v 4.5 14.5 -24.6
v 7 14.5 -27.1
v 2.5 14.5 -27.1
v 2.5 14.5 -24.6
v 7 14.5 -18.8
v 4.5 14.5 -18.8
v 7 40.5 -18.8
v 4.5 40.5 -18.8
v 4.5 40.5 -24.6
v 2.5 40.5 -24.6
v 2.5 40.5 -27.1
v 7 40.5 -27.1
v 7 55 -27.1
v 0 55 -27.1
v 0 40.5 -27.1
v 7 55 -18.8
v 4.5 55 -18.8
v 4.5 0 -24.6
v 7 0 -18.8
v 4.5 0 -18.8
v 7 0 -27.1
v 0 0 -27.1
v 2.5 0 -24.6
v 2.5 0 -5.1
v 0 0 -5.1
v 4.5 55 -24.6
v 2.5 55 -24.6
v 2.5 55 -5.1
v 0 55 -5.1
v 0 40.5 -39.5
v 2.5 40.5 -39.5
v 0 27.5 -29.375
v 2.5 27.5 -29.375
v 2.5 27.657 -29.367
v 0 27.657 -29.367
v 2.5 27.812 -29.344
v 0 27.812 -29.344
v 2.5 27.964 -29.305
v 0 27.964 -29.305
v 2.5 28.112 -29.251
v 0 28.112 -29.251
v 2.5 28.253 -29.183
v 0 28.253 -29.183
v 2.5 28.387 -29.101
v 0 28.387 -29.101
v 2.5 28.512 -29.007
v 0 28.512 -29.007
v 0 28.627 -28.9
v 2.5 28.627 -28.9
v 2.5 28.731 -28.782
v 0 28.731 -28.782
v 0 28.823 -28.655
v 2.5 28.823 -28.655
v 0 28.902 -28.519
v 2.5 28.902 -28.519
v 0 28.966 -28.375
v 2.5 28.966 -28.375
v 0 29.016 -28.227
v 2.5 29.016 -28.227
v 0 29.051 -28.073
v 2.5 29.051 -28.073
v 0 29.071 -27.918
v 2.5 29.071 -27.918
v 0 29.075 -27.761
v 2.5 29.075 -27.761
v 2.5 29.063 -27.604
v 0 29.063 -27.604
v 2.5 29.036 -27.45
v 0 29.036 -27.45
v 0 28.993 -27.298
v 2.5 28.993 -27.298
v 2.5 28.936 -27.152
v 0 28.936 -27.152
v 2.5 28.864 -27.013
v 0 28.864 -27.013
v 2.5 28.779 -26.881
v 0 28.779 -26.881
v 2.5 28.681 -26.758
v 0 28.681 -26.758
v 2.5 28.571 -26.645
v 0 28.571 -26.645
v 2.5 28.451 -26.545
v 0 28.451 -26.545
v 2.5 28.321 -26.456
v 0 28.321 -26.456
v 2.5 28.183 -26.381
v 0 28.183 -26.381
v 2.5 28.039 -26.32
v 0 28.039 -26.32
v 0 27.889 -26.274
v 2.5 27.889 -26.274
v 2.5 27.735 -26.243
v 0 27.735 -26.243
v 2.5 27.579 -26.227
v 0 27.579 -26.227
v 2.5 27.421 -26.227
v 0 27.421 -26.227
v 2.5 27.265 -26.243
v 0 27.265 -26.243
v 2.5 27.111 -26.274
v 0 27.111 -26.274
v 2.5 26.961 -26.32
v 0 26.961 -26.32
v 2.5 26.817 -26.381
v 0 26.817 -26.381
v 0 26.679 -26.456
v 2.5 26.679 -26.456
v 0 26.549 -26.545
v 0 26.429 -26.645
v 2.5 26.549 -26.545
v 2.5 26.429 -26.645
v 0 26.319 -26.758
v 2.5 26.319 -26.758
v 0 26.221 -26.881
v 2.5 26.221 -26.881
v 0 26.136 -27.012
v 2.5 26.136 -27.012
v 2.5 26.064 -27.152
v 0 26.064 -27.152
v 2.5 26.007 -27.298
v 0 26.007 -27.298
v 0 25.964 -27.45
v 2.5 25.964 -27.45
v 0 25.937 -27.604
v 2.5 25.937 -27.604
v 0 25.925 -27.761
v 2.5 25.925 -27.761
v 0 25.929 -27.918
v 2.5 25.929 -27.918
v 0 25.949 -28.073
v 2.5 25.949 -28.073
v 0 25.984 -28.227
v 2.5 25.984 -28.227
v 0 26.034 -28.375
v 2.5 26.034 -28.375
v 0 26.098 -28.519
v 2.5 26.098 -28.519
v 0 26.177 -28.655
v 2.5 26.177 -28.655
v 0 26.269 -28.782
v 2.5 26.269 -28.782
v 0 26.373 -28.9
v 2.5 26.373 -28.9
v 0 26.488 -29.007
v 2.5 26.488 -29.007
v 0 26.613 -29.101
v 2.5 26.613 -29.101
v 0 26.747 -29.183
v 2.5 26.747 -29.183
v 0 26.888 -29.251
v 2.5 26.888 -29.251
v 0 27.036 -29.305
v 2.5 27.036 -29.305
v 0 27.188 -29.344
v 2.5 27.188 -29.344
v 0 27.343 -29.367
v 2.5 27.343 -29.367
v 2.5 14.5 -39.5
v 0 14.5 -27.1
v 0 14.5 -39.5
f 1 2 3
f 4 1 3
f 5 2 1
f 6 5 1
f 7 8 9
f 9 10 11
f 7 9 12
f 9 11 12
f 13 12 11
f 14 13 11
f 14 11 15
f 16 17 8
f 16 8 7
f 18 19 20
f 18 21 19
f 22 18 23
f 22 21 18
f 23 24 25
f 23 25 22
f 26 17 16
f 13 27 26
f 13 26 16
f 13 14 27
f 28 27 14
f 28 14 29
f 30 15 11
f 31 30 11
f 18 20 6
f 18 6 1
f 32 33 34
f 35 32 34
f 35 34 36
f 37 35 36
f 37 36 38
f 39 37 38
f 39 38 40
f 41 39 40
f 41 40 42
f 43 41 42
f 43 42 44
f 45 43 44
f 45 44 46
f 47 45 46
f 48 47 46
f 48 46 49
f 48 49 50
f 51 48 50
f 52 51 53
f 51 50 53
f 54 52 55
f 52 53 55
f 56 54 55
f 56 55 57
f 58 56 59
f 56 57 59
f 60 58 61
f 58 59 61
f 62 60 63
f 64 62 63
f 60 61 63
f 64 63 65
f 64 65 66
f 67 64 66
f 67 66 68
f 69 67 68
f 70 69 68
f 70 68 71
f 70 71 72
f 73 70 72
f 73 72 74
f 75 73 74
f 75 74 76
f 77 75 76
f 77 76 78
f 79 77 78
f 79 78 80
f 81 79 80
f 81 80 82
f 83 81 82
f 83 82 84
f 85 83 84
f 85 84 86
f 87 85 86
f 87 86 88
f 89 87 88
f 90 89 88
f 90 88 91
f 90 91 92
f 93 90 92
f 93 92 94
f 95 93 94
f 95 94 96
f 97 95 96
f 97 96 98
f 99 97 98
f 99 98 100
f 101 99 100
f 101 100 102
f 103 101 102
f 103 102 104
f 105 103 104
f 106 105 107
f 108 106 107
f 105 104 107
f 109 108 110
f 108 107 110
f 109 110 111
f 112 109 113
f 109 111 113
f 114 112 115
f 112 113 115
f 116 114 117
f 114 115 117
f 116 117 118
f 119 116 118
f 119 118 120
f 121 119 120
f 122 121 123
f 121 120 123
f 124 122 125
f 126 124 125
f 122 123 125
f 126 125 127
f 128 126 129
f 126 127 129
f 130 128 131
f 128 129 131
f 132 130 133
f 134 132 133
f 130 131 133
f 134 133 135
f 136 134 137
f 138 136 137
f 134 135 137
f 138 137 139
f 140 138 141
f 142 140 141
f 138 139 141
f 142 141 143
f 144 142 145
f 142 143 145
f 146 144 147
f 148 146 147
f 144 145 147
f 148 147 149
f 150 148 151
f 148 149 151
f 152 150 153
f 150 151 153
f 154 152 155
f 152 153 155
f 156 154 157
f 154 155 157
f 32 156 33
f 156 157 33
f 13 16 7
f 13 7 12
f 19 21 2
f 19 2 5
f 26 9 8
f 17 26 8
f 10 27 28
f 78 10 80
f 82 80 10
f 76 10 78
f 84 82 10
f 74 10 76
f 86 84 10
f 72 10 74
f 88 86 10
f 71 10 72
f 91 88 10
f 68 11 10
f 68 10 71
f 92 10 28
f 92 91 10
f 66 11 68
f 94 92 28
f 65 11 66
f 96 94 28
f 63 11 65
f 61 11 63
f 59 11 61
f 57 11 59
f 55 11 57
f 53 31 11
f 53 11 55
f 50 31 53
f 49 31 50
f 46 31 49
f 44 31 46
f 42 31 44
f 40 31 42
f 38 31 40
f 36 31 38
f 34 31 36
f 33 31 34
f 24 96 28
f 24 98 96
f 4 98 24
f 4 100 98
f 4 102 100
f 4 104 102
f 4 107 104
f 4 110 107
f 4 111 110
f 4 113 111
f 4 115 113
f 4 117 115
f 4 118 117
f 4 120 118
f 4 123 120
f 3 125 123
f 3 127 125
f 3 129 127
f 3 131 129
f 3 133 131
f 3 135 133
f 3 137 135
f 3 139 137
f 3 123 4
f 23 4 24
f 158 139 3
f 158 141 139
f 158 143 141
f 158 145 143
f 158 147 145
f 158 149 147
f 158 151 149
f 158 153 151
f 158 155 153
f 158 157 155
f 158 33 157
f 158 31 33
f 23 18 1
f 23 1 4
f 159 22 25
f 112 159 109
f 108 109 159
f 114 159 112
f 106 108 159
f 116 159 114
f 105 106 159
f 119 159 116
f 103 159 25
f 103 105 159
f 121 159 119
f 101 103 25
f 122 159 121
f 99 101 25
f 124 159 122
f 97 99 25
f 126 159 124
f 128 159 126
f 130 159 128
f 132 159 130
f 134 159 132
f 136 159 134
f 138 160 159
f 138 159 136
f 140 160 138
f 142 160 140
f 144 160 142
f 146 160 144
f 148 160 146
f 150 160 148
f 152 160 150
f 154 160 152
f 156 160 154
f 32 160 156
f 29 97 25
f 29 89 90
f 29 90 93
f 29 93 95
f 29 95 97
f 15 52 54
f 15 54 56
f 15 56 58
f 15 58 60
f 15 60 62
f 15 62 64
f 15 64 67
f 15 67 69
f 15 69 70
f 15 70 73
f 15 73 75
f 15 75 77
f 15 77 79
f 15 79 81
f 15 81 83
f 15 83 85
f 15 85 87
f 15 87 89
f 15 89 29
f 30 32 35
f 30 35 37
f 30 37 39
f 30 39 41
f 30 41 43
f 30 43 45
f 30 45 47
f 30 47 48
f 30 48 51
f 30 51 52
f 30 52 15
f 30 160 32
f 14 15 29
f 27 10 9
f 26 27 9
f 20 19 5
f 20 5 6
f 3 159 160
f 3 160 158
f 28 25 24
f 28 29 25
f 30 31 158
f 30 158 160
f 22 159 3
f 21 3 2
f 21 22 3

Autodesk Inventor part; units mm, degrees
ref_plane "YZ Plane" through (0, 0, 0) normal (1, 0, 0) x (0, 1, 0)
ref_plane "XZ Plane" through (0, 0, 0) normal (0, 1, 0) x (-1, 0, 0)
ref_plane "XY Plane" through (0, 0, 0) normal (0, 0, 1) x (1, 0, 0)
sketch "Sketch1" plane through (0, 0, 0) normal (0, 1, 0) x (-1, 0, 0)
  line L0 (0, 27.1) -> (0, -27.1)
  line L1 (0, 27.1) -> (-6.8, 27.1)
  line L2 (-6.8, 27.1) -> (-6.8, 18.8)
  line L3 (-6.8, 18.8) -> (-4.3, 18.8)
  line L4 (-4.3, 18.8) -> (-4.3, 24.6)
  line L5 (-4.3, 24.6) -> (-2.5, 24.6)
  line L6 (-2.5, 24.6) -> (-2.5, 0)
  line L7 (0, -27.1) -> (-7, -27.1)
  line L8 (-7, -27.1) -> (-7, -18.8)
  line L9 (-7, -18.8) -> (-4.5, -18.8)
  line L10 (-4.5, -18.8) -> (-4.5, -24.6)
  line L11 (-4.5, -24.6) -> (-2.5, -24.6)
  line L12 (-2.5, -24.6) -> (-2.5, 0)
  point P0 (0, 0)
  dimension "d0" = 54.2
  dimension "d1" = 6.8
  dimension "d2" = 8.3
  dimension "d3" = 2.5
  dimension "d4" = 5.8
  dimension "d5" = 1.8
  dimension "d6" = 8.3
  dimension "d7" = 5.8
extrude "Extrusion1" add sketch "Sketch1" along normal blind 14.5
sketch "Sketch2" plane through (0, 14.5, 0) normal (0, 1, 0) x (1, 0, 0)
  line L0 (2.5, -24.6) -> (2.5, 24.6) projected
  line L1 (2.5, 0) -> (2.5, 39.5)
  line L2 (2.5, 39.5) -> (0, 39.5)
  line L3 (0, 39.5) -> (0, 0)
  line L4 (0, 0) -> (0, -39.5)
  line L5 (0, 27.1) -> (0, -27.1) projected
  line L6 (0, -39.5) -> (2.5, -39.5)
  line L7 (2.5, -39.5) -> (2.5, 0)
  point P0 (2.5, -24.6)
  point P1 (2.5, 24.6)
  dimension "d10" = 39.5
  dimension "d11" = 39.5
extrude "Extrusion2" add sketch "Sketch2" along normal blind 26
sketch "Sketch3" plane through (0, 40.5, 0) normal (0, 1, 0) x (1, 0, 0)
  line L0 (2.5, -24.6) -> (2.5, 24.6) projected
  line L1 (2.5, 0) -> (2.5, 24.6558)
  line L2 (0, 27.1) -> (0, -27.1) projected
  line L3 (4.3, -24.6) -> (2.5, -24.6) projected
  line L4 (6.8, -18.8) -> (4.3, -18.8) projected
  line L5 (4.3, -24.6) -> (4.3, -18.8)
  line L6 (4.3, -18.8) -> (6.8, -18.8)
  line L7 (6.8, -18.8) -> (6.8, -27.1)
  line L8 (6.8, -27.1) -> (2.5, -27.1)
  line L9 (2.5, 0) -> (2.5, 24.6558)
  line L10 (2.5, 24.6) -> (4.5, 24.6) projected
  line L11 (4.5, 18.8) -> (7, 18.8) projected
  line L12 (4.5, 24.6) -> (4.5, 18.8)
  line L13 (4.5, 18.8) -> (7, 18.8)
  line L14 (7, 18.8) -> (7, 27.1)
  line L15 (7, 27.1) -> (0, 27.1)
  line L16 (0, 27.1) -> (0, -27.1)
  line L17 (6.8, -27.1) -> (0, -27.1)
  line L18 (4.3, -24.6) -> (2.5, -24.6)
  point P0 (0, 0)
extrude "Extrusion3" add sketch "Sketch3" along normal blind 14.5
sketch "Sketch4" plane through (2.5, 0, 24.6) normal (1, 0, 0) x (0, 0, -1)
  line L0 (64.1, 14.5) -> (64.1, 40.5) projected
  line L1 (-14.9, 14.5) -> (-14.9, 40.5) projected
  line L2 (-14.9, 27.5) -> (-1.5, 27.5)
  circle A0 centre (-1.5, 27.5) radius 1.5
  line L3 (64.1, 14.5) -> (64.1, 40.5) projected
  circle A1 centre (52.4, 27.5) radius 1.575
  line L4 (52.4, 27.5) -> (64.1, 27.5)
  point P0 (24.6, 0)
  dimension "d18" = 13.4
  dimension "d19" = 3
extrude "Extrusion4" cut sketch "Sketch4" against normal blind 4.5
sketch "Sketch5" plane through (0, 0, -27.1) normal (-1, 0, 0) x (0, 0, 1)
  line L0 (27.1, 0) -> (21.3, 0)
  line L1 (51.7, 0) -> (2.5, 0) projected
  line L2 (21.3, 0) -> (21.3, 55)
  line L3 (51.7, 55) -> (2.5, 55) projected
  line L4 (27.1, 55) -> (32.9, 55)
  line L5 (32.9, 55) -> (32.9, 0)
  line L6 (32.9, 0) -> (27.1, 0)
  dimension "d22" = 5.8
  dimension "d23" = 5.8
extrude "Extrusion5" cut sketch "Sketch5" against normal blind 62.3875
sketch "Sketch6" plane through (0, 0, 5.8) normal (0, 0, -1) x (-1, 0, 0)
  point P0 (0, 0)
sketch "Sketch7" plane through (0, 14.5, 27.1) normal (-1, 0, 0) x (0, 0, 1)
  line L0 (-21.3, -14.5) -> (0, -14.5) projected
  line L1 (-21.3, -14.5) -> (18.5957, -14.5)
  line L2 (18.5957, -14.5) -> (18.5957, 49.9868)
  line L3 (18.5957, 49.9868) -> (-21.3, 49.9868)
  line L4 (-21.3, 49.9868) -> (-21.3, -14.5)
  point P0 (-27.1, -14.5)
extrude "Extrusion6" cut sketch "Sketch7" against normal blind 62.3875
sketch "Sketch8" plane through (0, 0, -5.8) normal (0, 0, 1) x (1, 0, 0)
  line L0 (0, 55) -> (2.5, 55)
  line L1 (2.5, 0) -> (0, 0) projected
  line L2 (2.5, 55) -> (2.5, 0)
  line L3 (2.5, 0) -> (0, 0)
  line L4 (0, 0) -> (0, 55)
extrude "Extrusion7" add sketch "Sketch8" along normal blind 0.7
properties part number "cam_holder3"
